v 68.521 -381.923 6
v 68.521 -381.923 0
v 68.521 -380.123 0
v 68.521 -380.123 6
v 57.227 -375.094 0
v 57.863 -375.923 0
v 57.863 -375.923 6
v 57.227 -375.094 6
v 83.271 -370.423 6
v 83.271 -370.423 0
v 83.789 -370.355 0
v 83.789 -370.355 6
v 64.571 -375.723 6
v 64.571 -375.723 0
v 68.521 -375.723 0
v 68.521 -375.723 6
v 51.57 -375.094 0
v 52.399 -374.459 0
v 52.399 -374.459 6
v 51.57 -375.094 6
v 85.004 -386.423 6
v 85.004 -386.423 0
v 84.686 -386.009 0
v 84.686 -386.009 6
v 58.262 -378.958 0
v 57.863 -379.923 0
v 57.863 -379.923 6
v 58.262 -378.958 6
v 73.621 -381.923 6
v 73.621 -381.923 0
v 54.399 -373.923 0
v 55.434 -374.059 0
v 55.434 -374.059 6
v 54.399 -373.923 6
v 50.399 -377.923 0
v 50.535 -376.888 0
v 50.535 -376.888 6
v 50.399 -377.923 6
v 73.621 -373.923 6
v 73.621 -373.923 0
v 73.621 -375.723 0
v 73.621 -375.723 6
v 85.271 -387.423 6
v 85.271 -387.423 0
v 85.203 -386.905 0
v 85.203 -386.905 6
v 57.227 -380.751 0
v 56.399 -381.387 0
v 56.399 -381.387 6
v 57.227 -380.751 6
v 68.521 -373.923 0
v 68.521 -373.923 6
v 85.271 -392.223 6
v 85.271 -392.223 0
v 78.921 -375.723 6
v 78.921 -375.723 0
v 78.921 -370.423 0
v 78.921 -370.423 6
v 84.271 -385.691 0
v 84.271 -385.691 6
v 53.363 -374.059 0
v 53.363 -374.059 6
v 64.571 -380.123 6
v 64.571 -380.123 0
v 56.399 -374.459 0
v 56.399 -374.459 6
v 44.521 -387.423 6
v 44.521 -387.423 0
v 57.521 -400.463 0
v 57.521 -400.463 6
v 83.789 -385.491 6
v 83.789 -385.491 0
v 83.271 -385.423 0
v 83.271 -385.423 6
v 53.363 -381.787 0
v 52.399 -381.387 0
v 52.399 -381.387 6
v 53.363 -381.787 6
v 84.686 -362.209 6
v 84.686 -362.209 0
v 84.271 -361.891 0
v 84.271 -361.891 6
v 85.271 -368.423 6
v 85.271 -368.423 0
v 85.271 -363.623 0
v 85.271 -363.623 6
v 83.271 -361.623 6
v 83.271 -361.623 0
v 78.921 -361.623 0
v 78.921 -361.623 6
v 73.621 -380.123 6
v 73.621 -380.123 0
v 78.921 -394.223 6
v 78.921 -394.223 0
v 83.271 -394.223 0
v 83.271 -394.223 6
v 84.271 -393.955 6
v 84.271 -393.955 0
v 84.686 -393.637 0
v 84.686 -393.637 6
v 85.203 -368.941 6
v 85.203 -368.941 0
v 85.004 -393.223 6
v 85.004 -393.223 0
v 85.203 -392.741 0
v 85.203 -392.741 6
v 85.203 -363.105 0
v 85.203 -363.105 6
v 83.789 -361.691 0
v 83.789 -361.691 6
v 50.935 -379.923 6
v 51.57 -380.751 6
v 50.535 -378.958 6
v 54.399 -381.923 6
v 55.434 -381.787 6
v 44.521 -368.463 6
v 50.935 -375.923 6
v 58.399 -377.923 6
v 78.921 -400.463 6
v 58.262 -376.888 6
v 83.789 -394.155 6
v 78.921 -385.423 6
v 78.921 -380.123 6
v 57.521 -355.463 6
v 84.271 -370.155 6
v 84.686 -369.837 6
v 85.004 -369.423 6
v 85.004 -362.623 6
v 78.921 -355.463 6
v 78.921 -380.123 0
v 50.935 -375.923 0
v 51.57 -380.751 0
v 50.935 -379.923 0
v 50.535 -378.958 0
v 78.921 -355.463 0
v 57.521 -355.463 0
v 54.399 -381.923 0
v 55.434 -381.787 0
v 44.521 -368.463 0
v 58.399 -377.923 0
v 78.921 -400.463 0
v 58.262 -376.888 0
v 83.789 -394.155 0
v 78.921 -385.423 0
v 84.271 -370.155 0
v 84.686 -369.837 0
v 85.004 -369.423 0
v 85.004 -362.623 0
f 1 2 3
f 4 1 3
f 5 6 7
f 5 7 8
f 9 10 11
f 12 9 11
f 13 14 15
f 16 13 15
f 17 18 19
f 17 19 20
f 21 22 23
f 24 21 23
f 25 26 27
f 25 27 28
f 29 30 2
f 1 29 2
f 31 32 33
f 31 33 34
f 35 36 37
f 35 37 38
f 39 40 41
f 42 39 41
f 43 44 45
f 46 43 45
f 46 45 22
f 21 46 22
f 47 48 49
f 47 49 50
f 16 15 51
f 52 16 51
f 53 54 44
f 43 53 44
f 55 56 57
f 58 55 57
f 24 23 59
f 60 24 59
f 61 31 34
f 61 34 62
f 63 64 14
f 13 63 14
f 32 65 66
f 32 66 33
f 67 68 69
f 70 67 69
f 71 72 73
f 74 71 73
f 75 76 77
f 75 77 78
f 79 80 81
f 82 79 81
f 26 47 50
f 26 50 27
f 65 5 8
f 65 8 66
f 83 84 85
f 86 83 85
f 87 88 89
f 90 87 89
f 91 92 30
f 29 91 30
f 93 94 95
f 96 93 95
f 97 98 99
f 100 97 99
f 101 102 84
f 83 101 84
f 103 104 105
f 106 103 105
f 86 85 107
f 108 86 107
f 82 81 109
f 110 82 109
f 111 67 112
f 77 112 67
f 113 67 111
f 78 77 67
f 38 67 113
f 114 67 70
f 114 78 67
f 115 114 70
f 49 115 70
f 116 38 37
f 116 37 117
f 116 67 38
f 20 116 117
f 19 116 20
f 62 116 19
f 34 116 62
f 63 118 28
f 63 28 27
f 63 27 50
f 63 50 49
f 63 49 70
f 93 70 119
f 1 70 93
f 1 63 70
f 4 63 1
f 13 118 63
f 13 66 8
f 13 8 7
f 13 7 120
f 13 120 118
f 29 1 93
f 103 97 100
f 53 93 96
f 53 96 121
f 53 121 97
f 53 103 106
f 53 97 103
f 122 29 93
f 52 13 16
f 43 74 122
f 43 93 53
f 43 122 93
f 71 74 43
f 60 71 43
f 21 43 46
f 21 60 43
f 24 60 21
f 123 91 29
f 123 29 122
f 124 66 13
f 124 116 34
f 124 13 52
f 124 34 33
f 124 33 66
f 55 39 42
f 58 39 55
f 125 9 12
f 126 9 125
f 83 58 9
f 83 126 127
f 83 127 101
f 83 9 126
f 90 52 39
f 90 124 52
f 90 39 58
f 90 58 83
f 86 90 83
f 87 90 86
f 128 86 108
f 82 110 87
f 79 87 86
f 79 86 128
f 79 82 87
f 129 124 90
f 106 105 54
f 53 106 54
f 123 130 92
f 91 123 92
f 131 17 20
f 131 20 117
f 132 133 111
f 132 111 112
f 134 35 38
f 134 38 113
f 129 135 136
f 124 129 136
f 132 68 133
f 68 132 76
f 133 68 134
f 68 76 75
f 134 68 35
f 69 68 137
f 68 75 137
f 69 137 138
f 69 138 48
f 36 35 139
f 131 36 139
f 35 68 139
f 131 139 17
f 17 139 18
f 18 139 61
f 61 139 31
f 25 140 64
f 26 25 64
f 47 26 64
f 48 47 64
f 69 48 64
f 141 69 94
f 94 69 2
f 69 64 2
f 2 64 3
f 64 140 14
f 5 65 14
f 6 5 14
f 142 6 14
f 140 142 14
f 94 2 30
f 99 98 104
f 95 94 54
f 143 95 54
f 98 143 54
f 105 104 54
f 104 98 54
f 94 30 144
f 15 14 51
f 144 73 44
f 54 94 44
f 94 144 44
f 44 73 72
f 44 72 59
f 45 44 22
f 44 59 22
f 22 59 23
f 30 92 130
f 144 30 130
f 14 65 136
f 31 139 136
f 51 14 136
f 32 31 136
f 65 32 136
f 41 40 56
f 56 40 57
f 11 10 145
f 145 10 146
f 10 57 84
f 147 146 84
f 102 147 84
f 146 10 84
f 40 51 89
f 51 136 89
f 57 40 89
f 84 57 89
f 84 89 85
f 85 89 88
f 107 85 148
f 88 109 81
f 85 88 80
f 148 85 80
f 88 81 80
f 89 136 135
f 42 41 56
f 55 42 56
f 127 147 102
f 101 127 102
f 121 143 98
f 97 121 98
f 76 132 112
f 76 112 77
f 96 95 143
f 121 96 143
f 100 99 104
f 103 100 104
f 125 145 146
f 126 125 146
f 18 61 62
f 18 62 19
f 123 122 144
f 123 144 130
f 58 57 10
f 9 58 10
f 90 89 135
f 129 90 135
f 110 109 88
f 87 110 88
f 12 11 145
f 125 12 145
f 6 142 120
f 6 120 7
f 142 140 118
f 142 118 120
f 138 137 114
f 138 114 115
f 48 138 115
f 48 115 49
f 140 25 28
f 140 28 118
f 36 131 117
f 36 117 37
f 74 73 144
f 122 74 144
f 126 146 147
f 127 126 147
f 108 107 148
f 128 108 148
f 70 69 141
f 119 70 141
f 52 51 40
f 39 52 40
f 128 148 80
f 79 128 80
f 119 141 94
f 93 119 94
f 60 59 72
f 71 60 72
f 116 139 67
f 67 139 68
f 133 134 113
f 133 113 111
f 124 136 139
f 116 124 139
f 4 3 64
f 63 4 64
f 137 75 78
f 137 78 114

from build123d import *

# Parameters (mm, degrees)
BOSS_EXTRUDE1_DEPTH = 6


with BuildPart() as part:
    # Sketch1 → Boss-Extrude1 (new body)
    with BuildSketch(Plane.XY):
        Polygon((57.521474666, -355.462944523), (44.521477546, -368.462941643), (44.521477546, -387.422916834), (57.521474666, -400.462926923), (78.921469418, -400.462926923), (78.921469418, -394.222907142), (83.271467309, -394.222907142), (83.7891054, -394.154758794), (84.271467309, -393.954957949), (84.685680872, -393.637120704), (85.003518117, -393.222907142), (85.203318962, -392.740545232), (85.271467309, -392.222907142), (85.271467309, -387.422911176), (85.203318962, -386.905273086), (85.003518117, -386.422911176), (84.685680872, -386.008697614), (84.271467309, -385.690860369), (83.7891054, -385.491059524), (83.271467309, -385.422911176), (78.921469418, -385.422911176), (78.921469418, -380.12291917), (73.621470596, -380.12291917), (73.621470596, -381.922917402), (68.521472832, -381.922917402), (68.521472832, -380.12291917), (64.57147301, -380.12291917), (64.57147301, -375.722914498), (68.521472832, -375.722914498), (68.521472832, -373.922916266), (73.621470596, -373.922916266), (73.621470596, -375.722914498), (78.921469418, -375.722914498), (78.921469418, -370.422917243), (83.271467309, -370.422917243), (83.7891054, -370.354768896), (84.271467309, -370.154968051), (84.685680872, -369.837130805), (85.003518117, -369.422917243), (85.203318962, -368.940555333), (85.271467309, -368.422917243), (85.271467309, -363.622922801), (85.203318962, -363.105284711), (85.003518117, -362.622922801), (84.685680872, -362.208709239), (84.271467309, -361.890871993), (83.7891054, -361.691071148), (83.271467309, -361.622922801), (78.921469418, -361.622922801), (78.921469418, -355.462944523), align=None)
        Polygon((50.398749784, -377.922916834), (50.535046479, -378.958193014), (50.934648169, -379.922916834), (51.57032266, -380.751343959), (52.398749784, -381.387018449), (53.363473604, -381.786620139), (54.398749784, -381.922916834), (55.434025965, -381.786620139), (56.398749784, -381.387018449), (57.227176909, -380.751343959), (57.862851399, -379.922916834), (58.262453089, -378.958193014), (58.398749784, -377.922916834), (58.262453089, -376.887640653), (57.862851399, -375.922916834), (57.227176909, -375.094489709), (56.398749784, -374.458815219), (55.434025965, -374.059213529), (54.398749784, -373.922916834), (53.363473604, -374.059213529), (52.398749784, -374.458815219), (51.57032266, -375.094489709), (50.934648169, -375.922916834), (50.535046479, -376.887640653), align=None, mode=Mode.SUBTRACT)
    extrude(amount=BOSS_EXTRUDE1_DEPTH)


solid = part.part
